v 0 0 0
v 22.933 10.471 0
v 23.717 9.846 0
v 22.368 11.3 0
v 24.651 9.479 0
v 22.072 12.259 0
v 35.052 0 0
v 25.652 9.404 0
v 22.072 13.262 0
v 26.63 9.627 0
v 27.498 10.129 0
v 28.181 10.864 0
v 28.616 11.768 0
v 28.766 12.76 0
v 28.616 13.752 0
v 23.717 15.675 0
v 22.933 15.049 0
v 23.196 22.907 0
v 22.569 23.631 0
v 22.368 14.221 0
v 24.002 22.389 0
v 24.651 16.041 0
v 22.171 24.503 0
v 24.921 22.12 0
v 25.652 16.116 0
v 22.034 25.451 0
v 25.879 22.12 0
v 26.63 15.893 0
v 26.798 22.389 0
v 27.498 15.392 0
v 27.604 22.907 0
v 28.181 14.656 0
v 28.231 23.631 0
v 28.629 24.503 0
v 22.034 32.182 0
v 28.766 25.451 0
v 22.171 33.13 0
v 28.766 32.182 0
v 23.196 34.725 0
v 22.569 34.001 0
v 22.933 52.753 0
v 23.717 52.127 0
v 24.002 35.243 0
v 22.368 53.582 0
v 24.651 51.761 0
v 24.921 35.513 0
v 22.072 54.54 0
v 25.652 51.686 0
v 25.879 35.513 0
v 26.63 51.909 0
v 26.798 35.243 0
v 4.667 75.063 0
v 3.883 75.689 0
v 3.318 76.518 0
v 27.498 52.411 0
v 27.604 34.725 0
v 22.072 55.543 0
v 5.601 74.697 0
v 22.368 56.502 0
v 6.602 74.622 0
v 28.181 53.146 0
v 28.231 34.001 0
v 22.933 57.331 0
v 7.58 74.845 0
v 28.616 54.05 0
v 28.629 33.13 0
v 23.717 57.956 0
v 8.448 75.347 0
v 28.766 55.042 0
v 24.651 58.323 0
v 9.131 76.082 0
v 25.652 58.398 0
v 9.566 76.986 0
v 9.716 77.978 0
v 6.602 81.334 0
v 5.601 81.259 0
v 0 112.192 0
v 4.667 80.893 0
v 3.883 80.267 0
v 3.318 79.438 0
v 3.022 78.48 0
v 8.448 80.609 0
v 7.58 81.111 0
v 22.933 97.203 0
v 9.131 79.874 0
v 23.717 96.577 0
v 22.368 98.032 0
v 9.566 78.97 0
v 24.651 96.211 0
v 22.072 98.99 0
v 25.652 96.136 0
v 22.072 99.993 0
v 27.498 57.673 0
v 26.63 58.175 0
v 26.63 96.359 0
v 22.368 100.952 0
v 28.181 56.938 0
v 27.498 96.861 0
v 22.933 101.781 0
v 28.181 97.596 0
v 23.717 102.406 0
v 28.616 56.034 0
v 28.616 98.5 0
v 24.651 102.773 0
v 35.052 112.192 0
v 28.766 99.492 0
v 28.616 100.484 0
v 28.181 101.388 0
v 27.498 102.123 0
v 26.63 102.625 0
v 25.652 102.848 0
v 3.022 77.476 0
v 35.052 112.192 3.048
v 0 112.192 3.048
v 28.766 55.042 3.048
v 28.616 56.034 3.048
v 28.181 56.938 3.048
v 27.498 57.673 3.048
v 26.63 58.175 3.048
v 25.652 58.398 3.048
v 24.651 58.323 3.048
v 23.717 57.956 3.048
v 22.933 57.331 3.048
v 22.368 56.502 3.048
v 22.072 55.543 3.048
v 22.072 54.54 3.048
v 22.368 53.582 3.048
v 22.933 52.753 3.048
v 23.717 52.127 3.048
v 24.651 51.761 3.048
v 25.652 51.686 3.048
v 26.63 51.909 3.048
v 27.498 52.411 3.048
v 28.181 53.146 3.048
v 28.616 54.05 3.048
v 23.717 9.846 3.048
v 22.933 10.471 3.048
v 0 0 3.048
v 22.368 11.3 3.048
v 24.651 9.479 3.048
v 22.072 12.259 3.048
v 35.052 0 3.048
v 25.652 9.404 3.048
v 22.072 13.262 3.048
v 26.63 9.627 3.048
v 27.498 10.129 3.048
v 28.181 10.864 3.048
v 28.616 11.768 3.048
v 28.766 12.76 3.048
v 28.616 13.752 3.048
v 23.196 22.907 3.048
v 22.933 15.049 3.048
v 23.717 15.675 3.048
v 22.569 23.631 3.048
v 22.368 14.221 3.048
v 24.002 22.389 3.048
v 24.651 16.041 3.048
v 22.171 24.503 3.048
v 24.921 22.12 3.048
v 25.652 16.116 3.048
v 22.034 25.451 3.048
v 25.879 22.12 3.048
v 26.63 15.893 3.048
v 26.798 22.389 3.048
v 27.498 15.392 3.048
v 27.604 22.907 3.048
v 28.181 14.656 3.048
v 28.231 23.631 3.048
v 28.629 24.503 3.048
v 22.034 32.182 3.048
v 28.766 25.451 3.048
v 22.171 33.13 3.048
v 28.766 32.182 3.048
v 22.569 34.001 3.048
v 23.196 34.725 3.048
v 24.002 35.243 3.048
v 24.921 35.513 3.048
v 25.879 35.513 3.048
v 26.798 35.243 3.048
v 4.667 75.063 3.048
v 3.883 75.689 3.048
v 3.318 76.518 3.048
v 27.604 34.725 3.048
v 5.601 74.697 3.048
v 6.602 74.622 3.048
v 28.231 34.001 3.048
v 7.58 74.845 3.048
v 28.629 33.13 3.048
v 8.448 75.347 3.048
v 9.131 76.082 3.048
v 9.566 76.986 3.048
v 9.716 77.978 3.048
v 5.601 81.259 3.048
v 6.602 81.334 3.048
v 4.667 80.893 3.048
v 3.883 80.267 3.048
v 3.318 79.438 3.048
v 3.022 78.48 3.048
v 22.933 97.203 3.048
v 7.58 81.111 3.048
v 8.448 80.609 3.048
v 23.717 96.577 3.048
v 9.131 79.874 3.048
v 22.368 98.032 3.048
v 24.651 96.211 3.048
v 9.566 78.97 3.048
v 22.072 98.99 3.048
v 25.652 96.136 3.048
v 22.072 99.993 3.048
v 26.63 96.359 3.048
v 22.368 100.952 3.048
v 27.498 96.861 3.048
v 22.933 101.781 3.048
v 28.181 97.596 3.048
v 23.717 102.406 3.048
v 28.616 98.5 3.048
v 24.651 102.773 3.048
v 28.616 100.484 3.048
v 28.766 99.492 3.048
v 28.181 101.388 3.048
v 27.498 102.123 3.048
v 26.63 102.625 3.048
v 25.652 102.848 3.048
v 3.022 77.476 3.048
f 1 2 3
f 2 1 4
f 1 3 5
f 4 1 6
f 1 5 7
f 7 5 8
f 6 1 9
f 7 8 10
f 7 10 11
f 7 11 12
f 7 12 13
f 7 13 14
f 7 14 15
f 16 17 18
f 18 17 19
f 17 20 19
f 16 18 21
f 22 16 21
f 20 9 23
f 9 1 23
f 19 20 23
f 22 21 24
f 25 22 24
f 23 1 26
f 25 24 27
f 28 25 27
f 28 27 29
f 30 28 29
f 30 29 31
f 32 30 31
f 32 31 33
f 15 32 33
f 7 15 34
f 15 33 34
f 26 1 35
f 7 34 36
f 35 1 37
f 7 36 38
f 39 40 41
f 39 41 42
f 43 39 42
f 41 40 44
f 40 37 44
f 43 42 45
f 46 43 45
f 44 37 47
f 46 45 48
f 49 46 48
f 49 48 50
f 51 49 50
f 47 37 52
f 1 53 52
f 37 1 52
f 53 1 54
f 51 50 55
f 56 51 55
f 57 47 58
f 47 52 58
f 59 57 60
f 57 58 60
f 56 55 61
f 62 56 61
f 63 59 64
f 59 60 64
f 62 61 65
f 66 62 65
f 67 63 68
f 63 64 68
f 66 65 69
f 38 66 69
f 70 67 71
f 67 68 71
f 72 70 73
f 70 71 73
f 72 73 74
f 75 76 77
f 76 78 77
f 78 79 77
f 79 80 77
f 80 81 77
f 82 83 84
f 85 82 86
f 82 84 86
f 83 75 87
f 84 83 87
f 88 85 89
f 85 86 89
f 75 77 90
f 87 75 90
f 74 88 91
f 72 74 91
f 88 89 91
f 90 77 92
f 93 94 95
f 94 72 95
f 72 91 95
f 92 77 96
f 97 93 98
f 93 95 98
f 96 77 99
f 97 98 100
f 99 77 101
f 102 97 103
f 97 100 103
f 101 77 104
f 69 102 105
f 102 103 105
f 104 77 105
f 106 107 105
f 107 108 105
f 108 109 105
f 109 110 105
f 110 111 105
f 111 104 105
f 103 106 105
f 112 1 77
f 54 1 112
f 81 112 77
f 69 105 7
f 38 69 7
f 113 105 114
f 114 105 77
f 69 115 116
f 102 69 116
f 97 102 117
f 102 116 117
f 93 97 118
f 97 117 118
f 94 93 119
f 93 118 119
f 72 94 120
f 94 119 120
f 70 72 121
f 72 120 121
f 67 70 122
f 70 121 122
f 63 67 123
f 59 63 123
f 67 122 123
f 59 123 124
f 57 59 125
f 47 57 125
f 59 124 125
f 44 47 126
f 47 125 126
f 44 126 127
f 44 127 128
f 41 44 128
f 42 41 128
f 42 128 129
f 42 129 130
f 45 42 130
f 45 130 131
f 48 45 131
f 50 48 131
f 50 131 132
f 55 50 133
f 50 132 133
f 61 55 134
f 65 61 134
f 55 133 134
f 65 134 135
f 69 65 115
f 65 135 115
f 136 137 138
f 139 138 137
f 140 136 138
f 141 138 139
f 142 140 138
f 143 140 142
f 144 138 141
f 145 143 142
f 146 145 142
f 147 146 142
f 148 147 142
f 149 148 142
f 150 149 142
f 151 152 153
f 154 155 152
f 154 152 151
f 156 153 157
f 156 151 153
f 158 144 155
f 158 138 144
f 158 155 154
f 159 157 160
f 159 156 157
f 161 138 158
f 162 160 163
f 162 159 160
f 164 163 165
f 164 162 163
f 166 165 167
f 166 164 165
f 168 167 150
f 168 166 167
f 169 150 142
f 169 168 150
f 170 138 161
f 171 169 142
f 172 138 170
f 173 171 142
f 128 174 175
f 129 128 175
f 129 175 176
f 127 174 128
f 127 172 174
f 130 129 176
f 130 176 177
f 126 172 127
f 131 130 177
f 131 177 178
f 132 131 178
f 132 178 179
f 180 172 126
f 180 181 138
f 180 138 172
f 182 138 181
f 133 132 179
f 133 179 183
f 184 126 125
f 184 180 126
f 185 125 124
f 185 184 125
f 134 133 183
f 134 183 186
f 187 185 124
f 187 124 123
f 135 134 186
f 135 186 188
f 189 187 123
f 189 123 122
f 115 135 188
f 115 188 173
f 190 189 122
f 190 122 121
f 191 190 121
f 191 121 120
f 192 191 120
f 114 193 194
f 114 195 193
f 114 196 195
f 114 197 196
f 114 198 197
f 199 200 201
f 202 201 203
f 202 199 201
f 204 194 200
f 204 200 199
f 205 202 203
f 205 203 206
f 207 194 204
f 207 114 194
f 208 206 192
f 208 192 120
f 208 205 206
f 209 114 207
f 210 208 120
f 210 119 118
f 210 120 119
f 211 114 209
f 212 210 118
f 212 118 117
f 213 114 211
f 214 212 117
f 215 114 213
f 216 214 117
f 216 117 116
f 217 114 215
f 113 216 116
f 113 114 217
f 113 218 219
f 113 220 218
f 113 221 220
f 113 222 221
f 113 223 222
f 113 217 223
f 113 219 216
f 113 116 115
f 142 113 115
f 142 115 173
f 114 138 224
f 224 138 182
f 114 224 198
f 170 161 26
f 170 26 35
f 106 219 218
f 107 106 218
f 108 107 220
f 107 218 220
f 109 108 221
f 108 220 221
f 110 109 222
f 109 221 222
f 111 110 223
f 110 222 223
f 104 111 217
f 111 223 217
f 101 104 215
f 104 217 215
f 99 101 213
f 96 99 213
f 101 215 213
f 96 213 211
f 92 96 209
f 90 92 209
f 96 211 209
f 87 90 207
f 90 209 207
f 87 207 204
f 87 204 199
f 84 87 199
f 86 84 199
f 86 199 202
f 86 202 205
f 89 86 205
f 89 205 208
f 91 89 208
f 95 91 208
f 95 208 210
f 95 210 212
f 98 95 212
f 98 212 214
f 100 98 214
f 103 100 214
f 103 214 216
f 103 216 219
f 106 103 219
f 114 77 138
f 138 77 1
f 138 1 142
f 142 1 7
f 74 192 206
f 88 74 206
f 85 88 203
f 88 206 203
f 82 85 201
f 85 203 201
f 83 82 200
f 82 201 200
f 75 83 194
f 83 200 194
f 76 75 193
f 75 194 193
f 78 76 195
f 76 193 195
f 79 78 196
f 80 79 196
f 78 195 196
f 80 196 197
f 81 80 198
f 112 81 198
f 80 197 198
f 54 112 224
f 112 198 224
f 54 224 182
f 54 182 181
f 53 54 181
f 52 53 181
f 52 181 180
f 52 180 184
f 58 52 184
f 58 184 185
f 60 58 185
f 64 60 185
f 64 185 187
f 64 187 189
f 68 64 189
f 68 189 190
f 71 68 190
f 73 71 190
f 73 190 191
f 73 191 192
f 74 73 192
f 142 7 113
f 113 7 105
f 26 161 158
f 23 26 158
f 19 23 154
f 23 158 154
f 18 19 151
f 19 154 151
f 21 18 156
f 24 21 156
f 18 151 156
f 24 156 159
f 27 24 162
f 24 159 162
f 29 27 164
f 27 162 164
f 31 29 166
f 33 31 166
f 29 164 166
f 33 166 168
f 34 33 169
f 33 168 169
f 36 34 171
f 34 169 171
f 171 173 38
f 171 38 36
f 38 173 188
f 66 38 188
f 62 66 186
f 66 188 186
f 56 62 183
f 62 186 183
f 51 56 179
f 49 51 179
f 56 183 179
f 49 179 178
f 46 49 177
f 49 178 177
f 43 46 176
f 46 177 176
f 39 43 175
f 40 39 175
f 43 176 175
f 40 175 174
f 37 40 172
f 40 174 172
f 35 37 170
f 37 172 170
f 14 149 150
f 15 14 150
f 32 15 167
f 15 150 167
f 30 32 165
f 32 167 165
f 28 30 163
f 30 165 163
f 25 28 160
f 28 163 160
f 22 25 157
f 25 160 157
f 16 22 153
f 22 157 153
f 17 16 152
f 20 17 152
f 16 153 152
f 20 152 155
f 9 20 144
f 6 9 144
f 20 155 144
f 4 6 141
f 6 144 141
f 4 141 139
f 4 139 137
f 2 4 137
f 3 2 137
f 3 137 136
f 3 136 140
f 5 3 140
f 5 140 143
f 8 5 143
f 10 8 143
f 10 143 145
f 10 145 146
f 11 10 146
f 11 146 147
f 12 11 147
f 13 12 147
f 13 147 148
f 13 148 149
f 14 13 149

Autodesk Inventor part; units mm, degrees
ref_plane "YZ Plane" through (0, 0, 0) normal (1, 0, 0) x (0, 1, 0)
ref_plane "XZ Plane" through (0, 0, 0) normal (0, 1, 0) x (-1, 0, 0)
ref_plane "XY Plane" through (0, 0, 0) normal (0, 0, 1) x (1, 0, 0)
sketch "Sketch1" plane through (0, 0, 0) normal (0, 0, 1) x (1, 0, 0)
  line L0 (0, 0) -> (35.052, 0)
  line L1 (35.052, 0) -> (35.052, 112.1918)
  line L2 (35.052, 112.1918) -> (0, 112.1918)
  line L3 (0, 112.1918) -> (0, 0)
  dimension "d0" = 35.052
  dimension "d1" = 112.1918
extrude "Plate1" add sketch "Sketch1" along normal blind 3.048
sketch "Sketch2" plane through (0, 0, 3.048) normal (0, 0, 1) x (1, 0, 0)
  circle A0 centre (25.4, 99.4918) radius 3.3655
  circle A1 centre (25.4, 12.7603) radius 3.3655
  circle A2 centre (25.4, 55.0418) radius 3.3655
  circle A3 centre (6.35, 77.978) radius 3.3655
  line L0 (0, 0) -> (0, 112.1918) projected
  line L1 (28.7655, 32.1818) -> (28.7655, 25.4508)
  line L2 (22.0345, 25.4508) -> (22.0345, 32.1818)
  arc A4 (28.7655, 32.1818) -> (22.0345, 32.1818) centre (25.4, 32.1818) ccw
  line L3 (22.0345, 32.1818) -> (22.0345, 32.1818)
  line L4 (28.7655, 32.1818) -> (28.7655, 32.1818)
  arc A5 (22.0345, 25.4508) -> (28.7655, 25.4508) centre (25.4, 25.4508) ccw
  line L5 (0, 112.1918) -> (35.052, 112.1918) projected
  line L6 (35.052, 112.1918) -> (35.052, 0) projected
  point P0 (25.786, 22.1075)
  dimension "hole" = 6.731
  dimension "d42" = 6.731
  dimension "d43" = 6.731
  dimension "d44" = 6.731
  dimension "d49" = 25.4
  dimension "d50" = 6.35
  dimension "d51" = 25.4
  dimension "d54" = 25.4
  dimension "d55" = 44.45
  dimension "d58" = 22.0345
  dimension "d62" = 6.731
  dimension "d63" = 22.86
  dimension "d64" = 12.6905
  dimension "d66" = 25.4
  dimension "d67" = 25.4
  dimension "d68" = 12.7
  dimension "d69" = 21.5138
  dimension "d70" = 3.3655
  dimension "d75" = 9.3472
  dimension "d78" = 6.731
  dimension "d80" = 180
  dimension "d81" = 6.731
extrude "Extrusion1" cut sketch "Sketch2" against normal blind 25.4
equation "\"d42\" = hole"
equation "\"d43\" = hole"
equation "\"d44\" = hole"
equation "\"d70\" = 0.5 * hole"
equation "\"BendRadius\" = Thickness"
equation "\"BendReliefWidth\" = Thickness"
equation "\"BendReliefDepth\" = 0.5 * Thickness"
equation "\"CornerReliefSize\" = 4 * Thickness"
equation "\"MinimumRemnant\" = 2 * Thickness"
equation "\"TransitionRadius\" = BendRadius"
equation "\"JacobiRadiusSize\" = BendRadius"
equation "\"GapSize\" = Thickness"
equation "\"d2\" = BendRadius"
equation "\"Thickness\" = 3.048"
properties part number "Clawplate"
